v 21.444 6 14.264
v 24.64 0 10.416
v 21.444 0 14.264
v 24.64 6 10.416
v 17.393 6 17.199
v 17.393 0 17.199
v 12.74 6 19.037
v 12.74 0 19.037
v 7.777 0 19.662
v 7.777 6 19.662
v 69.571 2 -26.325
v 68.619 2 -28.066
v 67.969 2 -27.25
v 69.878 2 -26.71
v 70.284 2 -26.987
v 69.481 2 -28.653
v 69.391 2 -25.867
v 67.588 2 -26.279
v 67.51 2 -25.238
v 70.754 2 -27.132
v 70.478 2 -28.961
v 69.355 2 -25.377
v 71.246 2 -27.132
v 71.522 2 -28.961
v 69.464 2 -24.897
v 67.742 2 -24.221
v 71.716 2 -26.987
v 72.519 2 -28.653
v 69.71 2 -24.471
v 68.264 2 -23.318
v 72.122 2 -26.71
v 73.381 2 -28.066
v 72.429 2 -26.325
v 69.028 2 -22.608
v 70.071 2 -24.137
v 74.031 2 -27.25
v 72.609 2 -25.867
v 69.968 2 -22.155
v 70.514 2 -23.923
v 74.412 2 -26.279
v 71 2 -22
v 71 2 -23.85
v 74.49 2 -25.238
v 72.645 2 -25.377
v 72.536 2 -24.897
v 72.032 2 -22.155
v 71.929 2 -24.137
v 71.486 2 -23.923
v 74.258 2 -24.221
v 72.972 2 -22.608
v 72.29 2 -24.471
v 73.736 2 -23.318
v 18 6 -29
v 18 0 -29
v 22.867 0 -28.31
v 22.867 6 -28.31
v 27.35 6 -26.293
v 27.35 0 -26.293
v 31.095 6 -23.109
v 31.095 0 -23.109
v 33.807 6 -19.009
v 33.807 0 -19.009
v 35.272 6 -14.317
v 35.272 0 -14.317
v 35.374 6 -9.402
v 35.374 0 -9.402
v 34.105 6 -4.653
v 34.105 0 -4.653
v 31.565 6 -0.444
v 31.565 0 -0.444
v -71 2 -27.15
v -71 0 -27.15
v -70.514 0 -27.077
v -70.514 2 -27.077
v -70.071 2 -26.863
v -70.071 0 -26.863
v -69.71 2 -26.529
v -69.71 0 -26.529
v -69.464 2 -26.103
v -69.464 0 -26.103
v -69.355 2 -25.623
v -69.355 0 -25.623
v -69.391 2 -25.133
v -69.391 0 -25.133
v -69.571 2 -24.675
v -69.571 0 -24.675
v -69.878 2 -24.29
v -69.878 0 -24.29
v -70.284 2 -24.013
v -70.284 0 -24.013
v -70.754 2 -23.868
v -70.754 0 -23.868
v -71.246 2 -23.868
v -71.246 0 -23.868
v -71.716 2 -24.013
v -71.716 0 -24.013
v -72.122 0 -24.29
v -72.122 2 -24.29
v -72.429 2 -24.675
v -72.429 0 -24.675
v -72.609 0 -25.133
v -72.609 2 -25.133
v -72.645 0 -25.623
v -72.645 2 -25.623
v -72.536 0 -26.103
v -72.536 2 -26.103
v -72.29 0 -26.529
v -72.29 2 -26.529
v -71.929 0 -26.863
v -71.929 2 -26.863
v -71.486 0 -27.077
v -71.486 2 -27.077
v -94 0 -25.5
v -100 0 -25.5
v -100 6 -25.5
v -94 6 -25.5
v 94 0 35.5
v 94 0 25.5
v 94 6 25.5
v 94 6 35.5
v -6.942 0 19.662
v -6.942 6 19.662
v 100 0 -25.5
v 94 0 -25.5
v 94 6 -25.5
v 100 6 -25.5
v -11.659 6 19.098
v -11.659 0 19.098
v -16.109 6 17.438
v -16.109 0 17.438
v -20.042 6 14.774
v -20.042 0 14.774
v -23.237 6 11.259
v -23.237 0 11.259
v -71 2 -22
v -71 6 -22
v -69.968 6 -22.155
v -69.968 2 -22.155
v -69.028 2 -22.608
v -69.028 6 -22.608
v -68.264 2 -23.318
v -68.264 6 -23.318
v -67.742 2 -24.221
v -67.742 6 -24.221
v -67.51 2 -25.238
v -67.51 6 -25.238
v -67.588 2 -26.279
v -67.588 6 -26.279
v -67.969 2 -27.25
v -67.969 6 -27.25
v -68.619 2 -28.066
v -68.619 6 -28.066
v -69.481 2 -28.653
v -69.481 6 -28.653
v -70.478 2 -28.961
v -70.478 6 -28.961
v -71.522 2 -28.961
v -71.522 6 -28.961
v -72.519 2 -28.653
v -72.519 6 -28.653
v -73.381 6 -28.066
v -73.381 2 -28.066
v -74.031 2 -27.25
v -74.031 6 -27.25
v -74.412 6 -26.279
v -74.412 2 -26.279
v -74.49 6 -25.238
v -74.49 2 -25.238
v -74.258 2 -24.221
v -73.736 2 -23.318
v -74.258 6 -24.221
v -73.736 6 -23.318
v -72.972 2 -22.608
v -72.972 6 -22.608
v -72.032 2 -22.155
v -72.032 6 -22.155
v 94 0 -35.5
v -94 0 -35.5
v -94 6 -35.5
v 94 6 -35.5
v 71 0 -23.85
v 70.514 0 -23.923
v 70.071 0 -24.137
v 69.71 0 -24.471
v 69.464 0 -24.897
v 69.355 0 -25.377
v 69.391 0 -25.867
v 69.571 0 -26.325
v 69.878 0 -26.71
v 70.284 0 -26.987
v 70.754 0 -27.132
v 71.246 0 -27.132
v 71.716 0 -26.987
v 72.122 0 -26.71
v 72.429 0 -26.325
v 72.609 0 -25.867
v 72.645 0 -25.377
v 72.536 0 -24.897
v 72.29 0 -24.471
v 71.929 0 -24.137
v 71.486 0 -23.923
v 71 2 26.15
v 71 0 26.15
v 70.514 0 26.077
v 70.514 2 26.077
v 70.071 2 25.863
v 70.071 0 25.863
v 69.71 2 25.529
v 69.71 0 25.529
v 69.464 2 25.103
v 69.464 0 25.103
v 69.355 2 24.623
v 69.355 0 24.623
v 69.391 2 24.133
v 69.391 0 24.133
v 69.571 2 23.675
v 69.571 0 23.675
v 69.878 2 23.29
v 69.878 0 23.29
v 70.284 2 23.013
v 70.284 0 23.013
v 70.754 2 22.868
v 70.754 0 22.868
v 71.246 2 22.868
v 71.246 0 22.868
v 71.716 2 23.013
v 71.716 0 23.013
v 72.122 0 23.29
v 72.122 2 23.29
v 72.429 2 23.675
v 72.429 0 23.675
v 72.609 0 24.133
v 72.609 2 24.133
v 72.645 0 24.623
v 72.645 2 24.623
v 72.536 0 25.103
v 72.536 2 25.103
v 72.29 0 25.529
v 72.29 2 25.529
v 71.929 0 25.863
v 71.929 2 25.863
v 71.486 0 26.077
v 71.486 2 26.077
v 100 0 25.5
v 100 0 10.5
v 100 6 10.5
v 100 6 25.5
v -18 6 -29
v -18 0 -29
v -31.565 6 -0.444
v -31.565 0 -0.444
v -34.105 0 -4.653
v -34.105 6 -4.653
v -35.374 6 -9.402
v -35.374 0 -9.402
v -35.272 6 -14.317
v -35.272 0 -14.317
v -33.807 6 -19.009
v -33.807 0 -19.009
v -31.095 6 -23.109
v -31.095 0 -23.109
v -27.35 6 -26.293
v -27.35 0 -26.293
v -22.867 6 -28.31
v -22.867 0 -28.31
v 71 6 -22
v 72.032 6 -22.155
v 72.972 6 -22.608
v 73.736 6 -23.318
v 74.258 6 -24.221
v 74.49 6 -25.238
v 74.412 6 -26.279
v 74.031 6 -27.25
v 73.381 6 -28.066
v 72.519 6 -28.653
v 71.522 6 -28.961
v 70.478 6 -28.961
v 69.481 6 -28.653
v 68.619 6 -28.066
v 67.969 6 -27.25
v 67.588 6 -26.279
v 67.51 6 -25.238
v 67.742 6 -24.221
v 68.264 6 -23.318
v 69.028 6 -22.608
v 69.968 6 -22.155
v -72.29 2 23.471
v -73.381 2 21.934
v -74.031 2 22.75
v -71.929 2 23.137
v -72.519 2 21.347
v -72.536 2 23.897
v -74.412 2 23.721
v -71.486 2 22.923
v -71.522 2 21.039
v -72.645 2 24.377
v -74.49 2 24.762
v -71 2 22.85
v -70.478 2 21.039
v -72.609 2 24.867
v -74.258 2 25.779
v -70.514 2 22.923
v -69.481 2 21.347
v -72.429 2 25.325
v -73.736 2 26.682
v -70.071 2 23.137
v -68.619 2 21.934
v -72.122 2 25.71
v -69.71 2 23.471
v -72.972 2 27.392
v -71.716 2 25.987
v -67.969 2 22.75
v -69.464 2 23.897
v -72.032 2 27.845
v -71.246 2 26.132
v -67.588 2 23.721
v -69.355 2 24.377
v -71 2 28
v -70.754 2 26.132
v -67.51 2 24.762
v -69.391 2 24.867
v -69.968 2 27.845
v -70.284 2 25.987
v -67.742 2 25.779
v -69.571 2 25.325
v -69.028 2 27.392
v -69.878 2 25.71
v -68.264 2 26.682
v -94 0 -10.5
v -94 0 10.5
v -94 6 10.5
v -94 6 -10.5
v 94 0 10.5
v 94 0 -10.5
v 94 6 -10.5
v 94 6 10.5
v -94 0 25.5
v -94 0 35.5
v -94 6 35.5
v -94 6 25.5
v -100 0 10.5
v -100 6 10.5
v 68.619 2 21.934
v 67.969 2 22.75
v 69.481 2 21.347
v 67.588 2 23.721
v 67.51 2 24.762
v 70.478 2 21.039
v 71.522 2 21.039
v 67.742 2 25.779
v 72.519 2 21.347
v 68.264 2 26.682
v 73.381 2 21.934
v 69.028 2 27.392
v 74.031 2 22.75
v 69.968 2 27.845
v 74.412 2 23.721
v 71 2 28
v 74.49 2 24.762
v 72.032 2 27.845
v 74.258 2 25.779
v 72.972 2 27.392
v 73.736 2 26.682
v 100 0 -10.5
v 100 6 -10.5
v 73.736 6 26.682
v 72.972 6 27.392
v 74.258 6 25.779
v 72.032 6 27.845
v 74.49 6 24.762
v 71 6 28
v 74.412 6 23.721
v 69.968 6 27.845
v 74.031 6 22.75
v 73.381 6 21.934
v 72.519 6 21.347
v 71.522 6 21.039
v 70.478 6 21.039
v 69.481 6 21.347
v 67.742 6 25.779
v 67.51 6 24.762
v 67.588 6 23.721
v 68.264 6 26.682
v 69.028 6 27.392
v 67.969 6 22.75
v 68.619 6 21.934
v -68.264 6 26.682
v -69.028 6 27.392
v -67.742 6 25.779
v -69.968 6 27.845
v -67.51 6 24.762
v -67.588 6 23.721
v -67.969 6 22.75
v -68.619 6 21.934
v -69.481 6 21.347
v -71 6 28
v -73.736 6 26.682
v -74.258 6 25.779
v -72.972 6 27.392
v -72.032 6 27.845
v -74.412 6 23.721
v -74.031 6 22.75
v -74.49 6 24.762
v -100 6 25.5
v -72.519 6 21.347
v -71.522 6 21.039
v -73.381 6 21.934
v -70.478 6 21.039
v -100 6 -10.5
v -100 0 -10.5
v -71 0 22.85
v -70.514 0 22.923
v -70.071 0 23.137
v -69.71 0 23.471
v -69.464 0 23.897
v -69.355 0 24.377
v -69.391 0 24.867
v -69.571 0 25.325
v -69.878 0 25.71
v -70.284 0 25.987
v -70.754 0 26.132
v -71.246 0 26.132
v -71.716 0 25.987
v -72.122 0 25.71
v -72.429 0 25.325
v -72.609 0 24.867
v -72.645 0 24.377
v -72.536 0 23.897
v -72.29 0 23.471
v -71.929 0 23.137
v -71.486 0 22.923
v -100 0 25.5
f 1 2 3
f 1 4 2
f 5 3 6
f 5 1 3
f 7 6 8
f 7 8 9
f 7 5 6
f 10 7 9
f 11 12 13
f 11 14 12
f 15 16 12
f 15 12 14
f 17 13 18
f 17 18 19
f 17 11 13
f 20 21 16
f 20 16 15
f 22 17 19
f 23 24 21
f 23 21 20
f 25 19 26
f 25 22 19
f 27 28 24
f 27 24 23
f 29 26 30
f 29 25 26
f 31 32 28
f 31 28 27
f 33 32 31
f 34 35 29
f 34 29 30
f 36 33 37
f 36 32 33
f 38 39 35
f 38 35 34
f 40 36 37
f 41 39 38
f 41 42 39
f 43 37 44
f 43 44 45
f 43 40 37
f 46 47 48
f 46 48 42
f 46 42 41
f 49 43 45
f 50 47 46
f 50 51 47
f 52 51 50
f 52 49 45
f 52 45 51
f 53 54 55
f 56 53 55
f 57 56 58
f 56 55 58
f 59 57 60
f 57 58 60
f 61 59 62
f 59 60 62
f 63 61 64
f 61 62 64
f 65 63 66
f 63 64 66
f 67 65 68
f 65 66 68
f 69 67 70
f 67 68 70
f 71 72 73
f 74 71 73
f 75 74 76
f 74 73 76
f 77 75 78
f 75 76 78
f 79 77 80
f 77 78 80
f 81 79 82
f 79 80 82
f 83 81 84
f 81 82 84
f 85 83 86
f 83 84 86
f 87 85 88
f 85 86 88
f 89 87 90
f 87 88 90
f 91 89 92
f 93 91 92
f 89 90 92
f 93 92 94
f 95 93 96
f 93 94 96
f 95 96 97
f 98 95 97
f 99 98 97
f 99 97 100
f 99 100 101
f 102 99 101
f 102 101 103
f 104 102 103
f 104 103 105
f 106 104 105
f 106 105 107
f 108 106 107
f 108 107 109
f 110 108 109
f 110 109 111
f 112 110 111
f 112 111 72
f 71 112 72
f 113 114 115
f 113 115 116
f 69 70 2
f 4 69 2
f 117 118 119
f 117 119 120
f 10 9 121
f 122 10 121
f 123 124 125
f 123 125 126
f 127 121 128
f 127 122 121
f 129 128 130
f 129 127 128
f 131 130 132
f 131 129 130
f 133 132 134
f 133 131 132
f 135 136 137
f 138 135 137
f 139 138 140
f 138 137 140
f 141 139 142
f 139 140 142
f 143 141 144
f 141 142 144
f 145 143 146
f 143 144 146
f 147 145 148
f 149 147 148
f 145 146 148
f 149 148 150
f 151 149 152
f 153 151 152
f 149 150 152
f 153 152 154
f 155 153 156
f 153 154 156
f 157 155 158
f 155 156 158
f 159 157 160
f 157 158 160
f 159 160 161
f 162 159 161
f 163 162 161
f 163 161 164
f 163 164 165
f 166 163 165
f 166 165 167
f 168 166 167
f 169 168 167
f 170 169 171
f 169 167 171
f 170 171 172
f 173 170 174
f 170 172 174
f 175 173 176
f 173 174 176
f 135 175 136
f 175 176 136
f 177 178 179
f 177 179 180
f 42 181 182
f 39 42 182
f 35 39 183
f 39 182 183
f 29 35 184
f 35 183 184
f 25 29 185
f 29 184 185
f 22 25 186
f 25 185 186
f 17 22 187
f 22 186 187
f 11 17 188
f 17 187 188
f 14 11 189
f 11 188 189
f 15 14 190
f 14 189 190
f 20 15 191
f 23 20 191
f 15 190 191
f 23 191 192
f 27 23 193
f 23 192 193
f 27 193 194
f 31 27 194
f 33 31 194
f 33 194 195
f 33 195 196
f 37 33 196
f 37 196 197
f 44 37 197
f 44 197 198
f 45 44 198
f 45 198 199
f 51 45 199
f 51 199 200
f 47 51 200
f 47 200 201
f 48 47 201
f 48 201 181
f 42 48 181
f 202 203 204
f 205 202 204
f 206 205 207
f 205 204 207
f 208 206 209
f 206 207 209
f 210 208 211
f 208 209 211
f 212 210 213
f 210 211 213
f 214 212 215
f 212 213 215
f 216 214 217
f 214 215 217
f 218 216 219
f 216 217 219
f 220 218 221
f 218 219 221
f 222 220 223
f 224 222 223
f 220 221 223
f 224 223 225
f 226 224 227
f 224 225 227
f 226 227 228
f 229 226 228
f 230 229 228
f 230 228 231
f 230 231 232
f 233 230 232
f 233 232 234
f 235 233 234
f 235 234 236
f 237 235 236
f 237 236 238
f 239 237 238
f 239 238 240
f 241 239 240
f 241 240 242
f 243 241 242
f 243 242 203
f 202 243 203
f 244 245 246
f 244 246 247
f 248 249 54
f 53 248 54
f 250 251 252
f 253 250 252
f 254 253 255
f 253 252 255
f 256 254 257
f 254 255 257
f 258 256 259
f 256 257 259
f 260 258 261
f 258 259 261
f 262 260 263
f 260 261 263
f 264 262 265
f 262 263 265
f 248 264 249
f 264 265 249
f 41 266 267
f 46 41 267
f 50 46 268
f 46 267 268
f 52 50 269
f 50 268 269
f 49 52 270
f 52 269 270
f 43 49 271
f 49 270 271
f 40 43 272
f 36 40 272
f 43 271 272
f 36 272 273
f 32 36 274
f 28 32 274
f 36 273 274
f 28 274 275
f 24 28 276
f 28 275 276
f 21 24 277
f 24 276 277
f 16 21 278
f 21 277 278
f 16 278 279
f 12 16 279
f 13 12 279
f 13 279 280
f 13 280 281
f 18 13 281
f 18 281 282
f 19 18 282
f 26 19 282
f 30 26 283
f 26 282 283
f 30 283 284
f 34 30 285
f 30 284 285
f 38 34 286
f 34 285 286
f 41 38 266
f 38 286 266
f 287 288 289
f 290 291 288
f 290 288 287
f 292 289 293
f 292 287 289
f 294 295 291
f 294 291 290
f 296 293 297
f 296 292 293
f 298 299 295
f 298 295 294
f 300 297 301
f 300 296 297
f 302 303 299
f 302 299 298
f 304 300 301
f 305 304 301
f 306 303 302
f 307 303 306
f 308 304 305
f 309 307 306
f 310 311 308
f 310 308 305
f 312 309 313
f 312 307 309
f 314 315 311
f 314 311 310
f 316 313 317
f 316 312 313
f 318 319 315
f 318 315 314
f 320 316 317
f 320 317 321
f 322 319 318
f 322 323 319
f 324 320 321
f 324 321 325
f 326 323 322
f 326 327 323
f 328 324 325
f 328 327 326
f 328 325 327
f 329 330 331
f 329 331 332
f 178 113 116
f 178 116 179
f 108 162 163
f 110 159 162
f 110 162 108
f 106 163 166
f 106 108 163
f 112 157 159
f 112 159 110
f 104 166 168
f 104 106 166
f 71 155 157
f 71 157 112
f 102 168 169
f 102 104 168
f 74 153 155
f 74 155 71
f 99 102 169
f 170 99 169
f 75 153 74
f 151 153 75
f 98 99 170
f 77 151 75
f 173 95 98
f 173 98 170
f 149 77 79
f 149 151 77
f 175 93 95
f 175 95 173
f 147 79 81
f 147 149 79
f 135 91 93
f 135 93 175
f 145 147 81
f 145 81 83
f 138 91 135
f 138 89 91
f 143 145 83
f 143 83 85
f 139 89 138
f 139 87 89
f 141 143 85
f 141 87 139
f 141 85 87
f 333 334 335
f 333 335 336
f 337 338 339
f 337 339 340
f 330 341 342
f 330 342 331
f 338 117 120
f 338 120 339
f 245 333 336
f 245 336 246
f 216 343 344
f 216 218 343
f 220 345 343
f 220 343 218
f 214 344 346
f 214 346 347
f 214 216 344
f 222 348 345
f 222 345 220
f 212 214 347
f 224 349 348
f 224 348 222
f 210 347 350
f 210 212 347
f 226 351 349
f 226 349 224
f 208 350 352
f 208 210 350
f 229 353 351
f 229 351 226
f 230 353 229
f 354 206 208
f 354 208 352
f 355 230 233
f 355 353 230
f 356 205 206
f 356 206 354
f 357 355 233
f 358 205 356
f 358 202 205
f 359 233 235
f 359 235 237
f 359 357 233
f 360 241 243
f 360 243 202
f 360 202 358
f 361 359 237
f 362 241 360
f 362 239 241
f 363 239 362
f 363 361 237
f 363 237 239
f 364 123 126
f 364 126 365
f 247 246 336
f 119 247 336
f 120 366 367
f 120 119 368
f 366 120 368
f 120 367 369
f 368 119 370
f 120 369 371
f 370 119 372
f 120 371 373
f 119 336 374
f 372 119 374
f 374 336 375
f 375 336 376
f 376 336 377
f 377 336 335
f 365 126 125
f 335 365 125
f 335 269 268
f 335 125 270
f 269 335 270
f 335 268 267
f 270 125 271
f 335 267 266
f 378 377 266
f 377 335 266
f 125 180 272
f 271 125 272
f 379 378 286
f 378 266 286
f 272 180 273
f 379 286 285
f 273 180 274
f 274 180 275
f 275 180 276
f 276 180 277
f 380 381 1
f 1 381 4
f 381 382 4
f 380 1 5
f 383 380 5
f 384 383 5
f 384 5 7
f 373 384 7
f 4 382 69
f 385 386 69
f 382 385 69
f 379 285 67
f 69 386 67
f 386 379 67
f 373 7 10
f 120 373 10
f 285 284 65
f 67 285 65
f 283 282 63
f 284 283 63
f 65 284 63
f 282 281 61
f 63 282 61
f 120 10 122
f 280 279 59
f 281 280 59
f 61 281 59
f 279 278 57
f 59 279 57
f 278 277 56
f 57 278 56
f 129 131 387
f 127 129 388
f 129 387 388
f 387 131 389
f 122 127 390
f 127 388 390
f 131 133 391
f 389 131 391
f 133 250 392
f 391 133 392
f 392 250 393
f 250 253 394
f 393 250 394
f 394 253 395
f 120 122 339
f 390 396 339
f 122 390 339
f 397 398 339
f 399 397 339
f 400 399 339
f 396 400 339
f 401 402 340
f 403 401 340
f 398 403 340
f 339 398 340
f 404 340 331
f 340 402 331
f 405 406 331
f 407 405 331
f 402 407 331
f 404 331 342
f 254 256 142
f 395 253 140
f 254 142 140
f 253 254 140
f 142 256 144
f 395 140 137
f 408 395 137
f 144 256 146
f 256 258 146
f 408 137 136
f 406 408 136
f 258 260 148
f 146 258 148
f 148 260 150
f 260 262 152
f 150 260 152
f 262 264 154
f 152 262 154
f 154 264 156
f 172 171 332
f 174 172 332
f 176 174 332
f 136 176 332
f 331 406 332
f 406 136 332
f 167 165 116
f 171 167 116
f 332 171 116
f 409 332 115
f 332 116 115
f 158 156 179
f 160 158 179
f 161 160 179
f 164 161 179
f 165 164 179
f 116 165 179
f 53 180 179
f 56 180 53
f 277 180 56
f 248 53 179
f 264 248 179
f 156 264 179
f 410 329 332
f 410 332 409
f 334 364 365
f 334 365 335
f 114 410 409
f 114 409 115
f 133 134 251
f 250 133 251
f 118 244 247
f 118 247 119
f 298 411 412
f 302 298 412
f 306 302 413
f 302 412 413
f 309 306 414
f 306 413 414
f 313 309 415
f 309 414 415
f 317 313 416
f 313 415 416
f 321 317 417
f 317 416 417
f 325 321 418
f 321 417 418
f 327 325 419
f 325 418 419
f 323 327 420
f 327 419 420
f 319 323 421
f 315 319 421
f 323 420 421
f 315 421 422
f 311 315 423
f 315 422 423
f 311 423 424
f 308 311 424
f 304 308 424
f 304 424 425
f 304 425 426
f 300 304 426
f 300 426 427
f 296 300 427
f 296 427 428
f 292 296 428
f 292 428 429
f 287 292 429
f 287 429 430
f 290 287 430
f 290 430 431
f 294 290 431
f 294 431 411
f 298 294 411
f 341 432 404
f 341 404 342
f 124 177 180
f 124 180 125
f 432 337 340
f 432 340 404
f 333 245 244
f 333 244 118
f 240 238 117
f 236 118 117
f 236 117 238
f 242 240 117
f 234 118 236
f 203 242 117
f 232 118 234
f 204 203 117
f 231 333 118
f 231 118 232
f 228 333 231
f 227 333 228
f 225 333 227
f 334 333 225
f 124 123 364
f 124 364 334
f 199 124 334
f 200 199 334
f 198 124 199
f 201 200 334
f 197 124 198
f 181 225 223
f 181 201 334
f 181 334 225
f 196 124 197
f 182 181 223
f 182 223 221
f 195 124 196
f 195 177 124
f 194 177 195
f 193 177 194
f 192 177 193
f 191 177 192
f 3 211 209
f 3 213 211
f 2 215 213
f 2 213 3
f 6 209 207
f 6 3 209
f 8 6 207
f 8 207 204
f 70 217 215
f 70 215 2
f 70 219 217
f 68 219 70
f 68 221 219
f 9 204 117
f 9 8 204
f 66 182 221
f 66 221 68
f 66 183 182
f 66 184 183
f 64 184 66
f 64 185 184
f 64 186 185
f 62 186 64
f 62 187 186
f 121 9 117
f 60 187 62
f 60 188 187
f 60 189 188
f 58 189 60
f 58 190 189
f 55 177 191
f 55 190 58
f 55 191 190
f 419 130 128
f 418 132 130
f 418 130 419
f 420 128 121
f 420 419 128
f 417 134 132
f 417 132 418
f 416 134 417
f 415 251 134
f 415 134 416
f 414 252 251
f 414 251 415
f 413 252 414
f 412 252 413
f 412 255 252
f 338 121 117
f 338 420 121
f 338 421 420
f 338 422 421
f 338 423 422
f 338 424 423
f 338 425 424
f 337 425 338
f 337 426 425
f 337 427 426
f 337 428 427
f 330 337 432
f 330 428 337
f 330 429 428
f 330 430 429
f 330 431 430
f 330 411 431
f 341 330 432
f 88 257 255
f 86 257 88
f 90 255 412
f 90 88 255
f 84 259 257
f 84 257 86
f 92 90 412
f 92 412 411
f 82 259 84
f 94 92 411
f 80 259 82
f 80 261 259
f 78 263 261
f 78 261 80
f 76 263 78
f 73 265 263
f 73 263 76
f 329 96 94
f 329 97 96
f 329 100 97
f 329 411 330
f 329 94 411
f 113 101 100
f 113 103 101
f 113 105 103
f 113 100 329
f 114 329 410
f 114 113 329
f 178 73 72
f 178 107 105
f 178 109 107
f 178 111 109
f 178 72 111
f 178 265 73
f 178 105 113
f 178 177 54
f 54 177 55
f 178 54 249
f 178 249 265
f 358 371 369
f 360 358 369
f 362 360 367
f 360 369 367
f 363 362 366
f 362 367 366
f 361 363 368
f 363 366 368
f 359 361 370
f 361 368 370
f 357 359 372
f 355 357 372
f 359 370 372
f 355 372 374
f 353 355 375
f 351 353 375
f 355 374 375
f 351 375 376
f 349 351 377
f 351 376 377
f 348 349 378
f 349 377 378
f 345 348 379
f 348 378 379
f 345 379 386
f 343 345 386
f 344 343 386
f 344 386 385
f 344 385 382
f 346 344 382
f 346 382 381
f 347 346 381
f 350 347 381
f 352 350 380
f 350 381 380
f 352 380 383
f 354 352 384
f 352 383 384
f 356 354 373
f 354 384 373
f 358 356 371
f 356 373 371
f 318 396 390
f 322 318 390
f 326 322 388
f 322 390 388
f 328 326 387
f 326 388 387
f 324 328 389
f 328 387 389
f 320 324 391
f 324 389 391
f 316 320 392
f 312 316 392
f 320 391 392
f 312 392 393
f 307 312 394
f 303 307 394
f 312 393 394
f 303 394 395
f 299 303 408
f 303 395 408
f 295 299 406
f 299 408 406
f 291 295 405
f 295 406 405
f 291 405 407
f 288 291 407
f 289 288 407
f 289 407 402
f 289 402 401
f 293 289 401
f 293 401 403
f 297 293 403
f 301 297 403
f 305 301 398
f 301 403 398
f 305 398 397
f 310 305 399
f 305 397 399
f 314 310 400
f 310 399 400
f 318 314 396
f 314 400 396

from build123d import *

# Parameters (mm, degrees)
BOSS_EXTRU_1_DEPTH      = 6
ESQUISSE2_R             = 17.5
ESQUISSE2_R_2           = 1.65
ENL_V_MAT_EXTRU_1_DEPTH = 107.283818147
ENL_V_MAT_EXTRU_3_DEPTH = 107.283818147
ESQUISSE6_R             = 3.5
ENL_V_MAT_EXTRU_4_DEPTH = 4
CONG_1_R                = 20


with BuildPart() as part:
    # Esquisse1 → Boss.-Extru.1 (new body)
    with BuildSketch(Plane(origin=(0, 0, 0), x_dir=(1, 0, 0), z_dir=(0, 1, 0))):
        Polygon((-94, -35.5), (-94, -25.5), (-100, -25.5), (-100, -10.5), (-94, -10.5), (-94, 10.5), (-100, 10.5), (-100, 25.5), (-94, 25.5), (-94, 35.5), (94, 35.5), (94, 25.5), (100, 25.5), (100, 10.5), (94, 10.5), (94, -10.5), (100, -10.5), (100, -25.5), (94, -25.5), (94, -35.5), align=None)
    extrude(amount=BOSS_EXTRU_1_DEPTH)

    # Esquisse2 → Enlèv. mat.-Extru.1 (cut, through all)
    with BuildSketch(Plane(origin=(0, 0, 0), x_dir=(-1, 0, 0), z_dir=(0, -1, 0))):
        with Locations(Location((18, 11.5, 0), (0, 0, 90))):
            Circle(ESQUISSE2_R)
        with Locations(Location((71, -24.5, 0), (0, 0, 90))):
            Circle(ESQUISSE2_R_2)
        with Locations(Location((71, 25.5, 0), (0, 0, 90))):
            Circle(ESQUISSE2_R_2)
        with Locations(Location((-71, 25.5, 0), (0, 0, 270))):
            Circle(ESQUISSE2_R_2)
        with Locations(Location((-71, -24.5, 0), (0, 0, 270))):
            Circle(ESQUISSE2_R_2)
        with Locations(Location((-18, 11.5, 0), (0, 0, 270))):
            Circle(ESQUISSE2_R)
    extrude(amount=-ENL_V_MAT_EXTRU_1_DEPTH, mode=Mode.SUBTRACT)

    # Esquisse5 → Enlèv. mat.-Extru.3 (cut, through all)
    with BuildSketch(Plane.XZ):
        Polygon((-31.565369037, -0.444197772), (-18, -29), (18, -29), (31.565369037, -0.444197772), (18.743702877, 19.662334717), (-17.256297123, 19.662334717), align=None)
    extrude(amount=-ENL_V_MAT_EXTRU_3_DEPTH, mode=Mode.SUBTRACT)

    # Esquisse6 → Enlèv. mat.-Extru.4 (cut)
    with BuildSketch(Plane(origin=(0, 6, 0), x_dir=(1, 0, 0), z_dir=(0, 1, 0))):
        with Locations(Location((71, -24.5, 0), (0, 0, 270))):
            Circle(ESQUISSE6_R)
        with Locations(Location((71, 25.5, 0), (0, 0, 270))):
            Circle(ESQUISSE6_R)
        with Locations(Location((-71, 25.5, 0), (0, 0, 270))):
            Circle(ESQUISSE6_R)
        with Locations(Location((-71, -24.5, 0), (0, 0, 270))):
            Circle(ESQUISSE6_R)
    extrude(amount=-ENL_V_MAT_EXTRU_4_DEPTH, mode=Mode.SUBTRACT)

    # Congé1
    cong_1_edges = [part.edges().sort_by_distance(p)[0] for p in [
        (-17.256297123, 3, 19.662334717),
        (18.743702877, 3, 19.662334717),
    ]]
    fillet(cong_1_edges, radius=CONG_1_R)


solid = part.part
